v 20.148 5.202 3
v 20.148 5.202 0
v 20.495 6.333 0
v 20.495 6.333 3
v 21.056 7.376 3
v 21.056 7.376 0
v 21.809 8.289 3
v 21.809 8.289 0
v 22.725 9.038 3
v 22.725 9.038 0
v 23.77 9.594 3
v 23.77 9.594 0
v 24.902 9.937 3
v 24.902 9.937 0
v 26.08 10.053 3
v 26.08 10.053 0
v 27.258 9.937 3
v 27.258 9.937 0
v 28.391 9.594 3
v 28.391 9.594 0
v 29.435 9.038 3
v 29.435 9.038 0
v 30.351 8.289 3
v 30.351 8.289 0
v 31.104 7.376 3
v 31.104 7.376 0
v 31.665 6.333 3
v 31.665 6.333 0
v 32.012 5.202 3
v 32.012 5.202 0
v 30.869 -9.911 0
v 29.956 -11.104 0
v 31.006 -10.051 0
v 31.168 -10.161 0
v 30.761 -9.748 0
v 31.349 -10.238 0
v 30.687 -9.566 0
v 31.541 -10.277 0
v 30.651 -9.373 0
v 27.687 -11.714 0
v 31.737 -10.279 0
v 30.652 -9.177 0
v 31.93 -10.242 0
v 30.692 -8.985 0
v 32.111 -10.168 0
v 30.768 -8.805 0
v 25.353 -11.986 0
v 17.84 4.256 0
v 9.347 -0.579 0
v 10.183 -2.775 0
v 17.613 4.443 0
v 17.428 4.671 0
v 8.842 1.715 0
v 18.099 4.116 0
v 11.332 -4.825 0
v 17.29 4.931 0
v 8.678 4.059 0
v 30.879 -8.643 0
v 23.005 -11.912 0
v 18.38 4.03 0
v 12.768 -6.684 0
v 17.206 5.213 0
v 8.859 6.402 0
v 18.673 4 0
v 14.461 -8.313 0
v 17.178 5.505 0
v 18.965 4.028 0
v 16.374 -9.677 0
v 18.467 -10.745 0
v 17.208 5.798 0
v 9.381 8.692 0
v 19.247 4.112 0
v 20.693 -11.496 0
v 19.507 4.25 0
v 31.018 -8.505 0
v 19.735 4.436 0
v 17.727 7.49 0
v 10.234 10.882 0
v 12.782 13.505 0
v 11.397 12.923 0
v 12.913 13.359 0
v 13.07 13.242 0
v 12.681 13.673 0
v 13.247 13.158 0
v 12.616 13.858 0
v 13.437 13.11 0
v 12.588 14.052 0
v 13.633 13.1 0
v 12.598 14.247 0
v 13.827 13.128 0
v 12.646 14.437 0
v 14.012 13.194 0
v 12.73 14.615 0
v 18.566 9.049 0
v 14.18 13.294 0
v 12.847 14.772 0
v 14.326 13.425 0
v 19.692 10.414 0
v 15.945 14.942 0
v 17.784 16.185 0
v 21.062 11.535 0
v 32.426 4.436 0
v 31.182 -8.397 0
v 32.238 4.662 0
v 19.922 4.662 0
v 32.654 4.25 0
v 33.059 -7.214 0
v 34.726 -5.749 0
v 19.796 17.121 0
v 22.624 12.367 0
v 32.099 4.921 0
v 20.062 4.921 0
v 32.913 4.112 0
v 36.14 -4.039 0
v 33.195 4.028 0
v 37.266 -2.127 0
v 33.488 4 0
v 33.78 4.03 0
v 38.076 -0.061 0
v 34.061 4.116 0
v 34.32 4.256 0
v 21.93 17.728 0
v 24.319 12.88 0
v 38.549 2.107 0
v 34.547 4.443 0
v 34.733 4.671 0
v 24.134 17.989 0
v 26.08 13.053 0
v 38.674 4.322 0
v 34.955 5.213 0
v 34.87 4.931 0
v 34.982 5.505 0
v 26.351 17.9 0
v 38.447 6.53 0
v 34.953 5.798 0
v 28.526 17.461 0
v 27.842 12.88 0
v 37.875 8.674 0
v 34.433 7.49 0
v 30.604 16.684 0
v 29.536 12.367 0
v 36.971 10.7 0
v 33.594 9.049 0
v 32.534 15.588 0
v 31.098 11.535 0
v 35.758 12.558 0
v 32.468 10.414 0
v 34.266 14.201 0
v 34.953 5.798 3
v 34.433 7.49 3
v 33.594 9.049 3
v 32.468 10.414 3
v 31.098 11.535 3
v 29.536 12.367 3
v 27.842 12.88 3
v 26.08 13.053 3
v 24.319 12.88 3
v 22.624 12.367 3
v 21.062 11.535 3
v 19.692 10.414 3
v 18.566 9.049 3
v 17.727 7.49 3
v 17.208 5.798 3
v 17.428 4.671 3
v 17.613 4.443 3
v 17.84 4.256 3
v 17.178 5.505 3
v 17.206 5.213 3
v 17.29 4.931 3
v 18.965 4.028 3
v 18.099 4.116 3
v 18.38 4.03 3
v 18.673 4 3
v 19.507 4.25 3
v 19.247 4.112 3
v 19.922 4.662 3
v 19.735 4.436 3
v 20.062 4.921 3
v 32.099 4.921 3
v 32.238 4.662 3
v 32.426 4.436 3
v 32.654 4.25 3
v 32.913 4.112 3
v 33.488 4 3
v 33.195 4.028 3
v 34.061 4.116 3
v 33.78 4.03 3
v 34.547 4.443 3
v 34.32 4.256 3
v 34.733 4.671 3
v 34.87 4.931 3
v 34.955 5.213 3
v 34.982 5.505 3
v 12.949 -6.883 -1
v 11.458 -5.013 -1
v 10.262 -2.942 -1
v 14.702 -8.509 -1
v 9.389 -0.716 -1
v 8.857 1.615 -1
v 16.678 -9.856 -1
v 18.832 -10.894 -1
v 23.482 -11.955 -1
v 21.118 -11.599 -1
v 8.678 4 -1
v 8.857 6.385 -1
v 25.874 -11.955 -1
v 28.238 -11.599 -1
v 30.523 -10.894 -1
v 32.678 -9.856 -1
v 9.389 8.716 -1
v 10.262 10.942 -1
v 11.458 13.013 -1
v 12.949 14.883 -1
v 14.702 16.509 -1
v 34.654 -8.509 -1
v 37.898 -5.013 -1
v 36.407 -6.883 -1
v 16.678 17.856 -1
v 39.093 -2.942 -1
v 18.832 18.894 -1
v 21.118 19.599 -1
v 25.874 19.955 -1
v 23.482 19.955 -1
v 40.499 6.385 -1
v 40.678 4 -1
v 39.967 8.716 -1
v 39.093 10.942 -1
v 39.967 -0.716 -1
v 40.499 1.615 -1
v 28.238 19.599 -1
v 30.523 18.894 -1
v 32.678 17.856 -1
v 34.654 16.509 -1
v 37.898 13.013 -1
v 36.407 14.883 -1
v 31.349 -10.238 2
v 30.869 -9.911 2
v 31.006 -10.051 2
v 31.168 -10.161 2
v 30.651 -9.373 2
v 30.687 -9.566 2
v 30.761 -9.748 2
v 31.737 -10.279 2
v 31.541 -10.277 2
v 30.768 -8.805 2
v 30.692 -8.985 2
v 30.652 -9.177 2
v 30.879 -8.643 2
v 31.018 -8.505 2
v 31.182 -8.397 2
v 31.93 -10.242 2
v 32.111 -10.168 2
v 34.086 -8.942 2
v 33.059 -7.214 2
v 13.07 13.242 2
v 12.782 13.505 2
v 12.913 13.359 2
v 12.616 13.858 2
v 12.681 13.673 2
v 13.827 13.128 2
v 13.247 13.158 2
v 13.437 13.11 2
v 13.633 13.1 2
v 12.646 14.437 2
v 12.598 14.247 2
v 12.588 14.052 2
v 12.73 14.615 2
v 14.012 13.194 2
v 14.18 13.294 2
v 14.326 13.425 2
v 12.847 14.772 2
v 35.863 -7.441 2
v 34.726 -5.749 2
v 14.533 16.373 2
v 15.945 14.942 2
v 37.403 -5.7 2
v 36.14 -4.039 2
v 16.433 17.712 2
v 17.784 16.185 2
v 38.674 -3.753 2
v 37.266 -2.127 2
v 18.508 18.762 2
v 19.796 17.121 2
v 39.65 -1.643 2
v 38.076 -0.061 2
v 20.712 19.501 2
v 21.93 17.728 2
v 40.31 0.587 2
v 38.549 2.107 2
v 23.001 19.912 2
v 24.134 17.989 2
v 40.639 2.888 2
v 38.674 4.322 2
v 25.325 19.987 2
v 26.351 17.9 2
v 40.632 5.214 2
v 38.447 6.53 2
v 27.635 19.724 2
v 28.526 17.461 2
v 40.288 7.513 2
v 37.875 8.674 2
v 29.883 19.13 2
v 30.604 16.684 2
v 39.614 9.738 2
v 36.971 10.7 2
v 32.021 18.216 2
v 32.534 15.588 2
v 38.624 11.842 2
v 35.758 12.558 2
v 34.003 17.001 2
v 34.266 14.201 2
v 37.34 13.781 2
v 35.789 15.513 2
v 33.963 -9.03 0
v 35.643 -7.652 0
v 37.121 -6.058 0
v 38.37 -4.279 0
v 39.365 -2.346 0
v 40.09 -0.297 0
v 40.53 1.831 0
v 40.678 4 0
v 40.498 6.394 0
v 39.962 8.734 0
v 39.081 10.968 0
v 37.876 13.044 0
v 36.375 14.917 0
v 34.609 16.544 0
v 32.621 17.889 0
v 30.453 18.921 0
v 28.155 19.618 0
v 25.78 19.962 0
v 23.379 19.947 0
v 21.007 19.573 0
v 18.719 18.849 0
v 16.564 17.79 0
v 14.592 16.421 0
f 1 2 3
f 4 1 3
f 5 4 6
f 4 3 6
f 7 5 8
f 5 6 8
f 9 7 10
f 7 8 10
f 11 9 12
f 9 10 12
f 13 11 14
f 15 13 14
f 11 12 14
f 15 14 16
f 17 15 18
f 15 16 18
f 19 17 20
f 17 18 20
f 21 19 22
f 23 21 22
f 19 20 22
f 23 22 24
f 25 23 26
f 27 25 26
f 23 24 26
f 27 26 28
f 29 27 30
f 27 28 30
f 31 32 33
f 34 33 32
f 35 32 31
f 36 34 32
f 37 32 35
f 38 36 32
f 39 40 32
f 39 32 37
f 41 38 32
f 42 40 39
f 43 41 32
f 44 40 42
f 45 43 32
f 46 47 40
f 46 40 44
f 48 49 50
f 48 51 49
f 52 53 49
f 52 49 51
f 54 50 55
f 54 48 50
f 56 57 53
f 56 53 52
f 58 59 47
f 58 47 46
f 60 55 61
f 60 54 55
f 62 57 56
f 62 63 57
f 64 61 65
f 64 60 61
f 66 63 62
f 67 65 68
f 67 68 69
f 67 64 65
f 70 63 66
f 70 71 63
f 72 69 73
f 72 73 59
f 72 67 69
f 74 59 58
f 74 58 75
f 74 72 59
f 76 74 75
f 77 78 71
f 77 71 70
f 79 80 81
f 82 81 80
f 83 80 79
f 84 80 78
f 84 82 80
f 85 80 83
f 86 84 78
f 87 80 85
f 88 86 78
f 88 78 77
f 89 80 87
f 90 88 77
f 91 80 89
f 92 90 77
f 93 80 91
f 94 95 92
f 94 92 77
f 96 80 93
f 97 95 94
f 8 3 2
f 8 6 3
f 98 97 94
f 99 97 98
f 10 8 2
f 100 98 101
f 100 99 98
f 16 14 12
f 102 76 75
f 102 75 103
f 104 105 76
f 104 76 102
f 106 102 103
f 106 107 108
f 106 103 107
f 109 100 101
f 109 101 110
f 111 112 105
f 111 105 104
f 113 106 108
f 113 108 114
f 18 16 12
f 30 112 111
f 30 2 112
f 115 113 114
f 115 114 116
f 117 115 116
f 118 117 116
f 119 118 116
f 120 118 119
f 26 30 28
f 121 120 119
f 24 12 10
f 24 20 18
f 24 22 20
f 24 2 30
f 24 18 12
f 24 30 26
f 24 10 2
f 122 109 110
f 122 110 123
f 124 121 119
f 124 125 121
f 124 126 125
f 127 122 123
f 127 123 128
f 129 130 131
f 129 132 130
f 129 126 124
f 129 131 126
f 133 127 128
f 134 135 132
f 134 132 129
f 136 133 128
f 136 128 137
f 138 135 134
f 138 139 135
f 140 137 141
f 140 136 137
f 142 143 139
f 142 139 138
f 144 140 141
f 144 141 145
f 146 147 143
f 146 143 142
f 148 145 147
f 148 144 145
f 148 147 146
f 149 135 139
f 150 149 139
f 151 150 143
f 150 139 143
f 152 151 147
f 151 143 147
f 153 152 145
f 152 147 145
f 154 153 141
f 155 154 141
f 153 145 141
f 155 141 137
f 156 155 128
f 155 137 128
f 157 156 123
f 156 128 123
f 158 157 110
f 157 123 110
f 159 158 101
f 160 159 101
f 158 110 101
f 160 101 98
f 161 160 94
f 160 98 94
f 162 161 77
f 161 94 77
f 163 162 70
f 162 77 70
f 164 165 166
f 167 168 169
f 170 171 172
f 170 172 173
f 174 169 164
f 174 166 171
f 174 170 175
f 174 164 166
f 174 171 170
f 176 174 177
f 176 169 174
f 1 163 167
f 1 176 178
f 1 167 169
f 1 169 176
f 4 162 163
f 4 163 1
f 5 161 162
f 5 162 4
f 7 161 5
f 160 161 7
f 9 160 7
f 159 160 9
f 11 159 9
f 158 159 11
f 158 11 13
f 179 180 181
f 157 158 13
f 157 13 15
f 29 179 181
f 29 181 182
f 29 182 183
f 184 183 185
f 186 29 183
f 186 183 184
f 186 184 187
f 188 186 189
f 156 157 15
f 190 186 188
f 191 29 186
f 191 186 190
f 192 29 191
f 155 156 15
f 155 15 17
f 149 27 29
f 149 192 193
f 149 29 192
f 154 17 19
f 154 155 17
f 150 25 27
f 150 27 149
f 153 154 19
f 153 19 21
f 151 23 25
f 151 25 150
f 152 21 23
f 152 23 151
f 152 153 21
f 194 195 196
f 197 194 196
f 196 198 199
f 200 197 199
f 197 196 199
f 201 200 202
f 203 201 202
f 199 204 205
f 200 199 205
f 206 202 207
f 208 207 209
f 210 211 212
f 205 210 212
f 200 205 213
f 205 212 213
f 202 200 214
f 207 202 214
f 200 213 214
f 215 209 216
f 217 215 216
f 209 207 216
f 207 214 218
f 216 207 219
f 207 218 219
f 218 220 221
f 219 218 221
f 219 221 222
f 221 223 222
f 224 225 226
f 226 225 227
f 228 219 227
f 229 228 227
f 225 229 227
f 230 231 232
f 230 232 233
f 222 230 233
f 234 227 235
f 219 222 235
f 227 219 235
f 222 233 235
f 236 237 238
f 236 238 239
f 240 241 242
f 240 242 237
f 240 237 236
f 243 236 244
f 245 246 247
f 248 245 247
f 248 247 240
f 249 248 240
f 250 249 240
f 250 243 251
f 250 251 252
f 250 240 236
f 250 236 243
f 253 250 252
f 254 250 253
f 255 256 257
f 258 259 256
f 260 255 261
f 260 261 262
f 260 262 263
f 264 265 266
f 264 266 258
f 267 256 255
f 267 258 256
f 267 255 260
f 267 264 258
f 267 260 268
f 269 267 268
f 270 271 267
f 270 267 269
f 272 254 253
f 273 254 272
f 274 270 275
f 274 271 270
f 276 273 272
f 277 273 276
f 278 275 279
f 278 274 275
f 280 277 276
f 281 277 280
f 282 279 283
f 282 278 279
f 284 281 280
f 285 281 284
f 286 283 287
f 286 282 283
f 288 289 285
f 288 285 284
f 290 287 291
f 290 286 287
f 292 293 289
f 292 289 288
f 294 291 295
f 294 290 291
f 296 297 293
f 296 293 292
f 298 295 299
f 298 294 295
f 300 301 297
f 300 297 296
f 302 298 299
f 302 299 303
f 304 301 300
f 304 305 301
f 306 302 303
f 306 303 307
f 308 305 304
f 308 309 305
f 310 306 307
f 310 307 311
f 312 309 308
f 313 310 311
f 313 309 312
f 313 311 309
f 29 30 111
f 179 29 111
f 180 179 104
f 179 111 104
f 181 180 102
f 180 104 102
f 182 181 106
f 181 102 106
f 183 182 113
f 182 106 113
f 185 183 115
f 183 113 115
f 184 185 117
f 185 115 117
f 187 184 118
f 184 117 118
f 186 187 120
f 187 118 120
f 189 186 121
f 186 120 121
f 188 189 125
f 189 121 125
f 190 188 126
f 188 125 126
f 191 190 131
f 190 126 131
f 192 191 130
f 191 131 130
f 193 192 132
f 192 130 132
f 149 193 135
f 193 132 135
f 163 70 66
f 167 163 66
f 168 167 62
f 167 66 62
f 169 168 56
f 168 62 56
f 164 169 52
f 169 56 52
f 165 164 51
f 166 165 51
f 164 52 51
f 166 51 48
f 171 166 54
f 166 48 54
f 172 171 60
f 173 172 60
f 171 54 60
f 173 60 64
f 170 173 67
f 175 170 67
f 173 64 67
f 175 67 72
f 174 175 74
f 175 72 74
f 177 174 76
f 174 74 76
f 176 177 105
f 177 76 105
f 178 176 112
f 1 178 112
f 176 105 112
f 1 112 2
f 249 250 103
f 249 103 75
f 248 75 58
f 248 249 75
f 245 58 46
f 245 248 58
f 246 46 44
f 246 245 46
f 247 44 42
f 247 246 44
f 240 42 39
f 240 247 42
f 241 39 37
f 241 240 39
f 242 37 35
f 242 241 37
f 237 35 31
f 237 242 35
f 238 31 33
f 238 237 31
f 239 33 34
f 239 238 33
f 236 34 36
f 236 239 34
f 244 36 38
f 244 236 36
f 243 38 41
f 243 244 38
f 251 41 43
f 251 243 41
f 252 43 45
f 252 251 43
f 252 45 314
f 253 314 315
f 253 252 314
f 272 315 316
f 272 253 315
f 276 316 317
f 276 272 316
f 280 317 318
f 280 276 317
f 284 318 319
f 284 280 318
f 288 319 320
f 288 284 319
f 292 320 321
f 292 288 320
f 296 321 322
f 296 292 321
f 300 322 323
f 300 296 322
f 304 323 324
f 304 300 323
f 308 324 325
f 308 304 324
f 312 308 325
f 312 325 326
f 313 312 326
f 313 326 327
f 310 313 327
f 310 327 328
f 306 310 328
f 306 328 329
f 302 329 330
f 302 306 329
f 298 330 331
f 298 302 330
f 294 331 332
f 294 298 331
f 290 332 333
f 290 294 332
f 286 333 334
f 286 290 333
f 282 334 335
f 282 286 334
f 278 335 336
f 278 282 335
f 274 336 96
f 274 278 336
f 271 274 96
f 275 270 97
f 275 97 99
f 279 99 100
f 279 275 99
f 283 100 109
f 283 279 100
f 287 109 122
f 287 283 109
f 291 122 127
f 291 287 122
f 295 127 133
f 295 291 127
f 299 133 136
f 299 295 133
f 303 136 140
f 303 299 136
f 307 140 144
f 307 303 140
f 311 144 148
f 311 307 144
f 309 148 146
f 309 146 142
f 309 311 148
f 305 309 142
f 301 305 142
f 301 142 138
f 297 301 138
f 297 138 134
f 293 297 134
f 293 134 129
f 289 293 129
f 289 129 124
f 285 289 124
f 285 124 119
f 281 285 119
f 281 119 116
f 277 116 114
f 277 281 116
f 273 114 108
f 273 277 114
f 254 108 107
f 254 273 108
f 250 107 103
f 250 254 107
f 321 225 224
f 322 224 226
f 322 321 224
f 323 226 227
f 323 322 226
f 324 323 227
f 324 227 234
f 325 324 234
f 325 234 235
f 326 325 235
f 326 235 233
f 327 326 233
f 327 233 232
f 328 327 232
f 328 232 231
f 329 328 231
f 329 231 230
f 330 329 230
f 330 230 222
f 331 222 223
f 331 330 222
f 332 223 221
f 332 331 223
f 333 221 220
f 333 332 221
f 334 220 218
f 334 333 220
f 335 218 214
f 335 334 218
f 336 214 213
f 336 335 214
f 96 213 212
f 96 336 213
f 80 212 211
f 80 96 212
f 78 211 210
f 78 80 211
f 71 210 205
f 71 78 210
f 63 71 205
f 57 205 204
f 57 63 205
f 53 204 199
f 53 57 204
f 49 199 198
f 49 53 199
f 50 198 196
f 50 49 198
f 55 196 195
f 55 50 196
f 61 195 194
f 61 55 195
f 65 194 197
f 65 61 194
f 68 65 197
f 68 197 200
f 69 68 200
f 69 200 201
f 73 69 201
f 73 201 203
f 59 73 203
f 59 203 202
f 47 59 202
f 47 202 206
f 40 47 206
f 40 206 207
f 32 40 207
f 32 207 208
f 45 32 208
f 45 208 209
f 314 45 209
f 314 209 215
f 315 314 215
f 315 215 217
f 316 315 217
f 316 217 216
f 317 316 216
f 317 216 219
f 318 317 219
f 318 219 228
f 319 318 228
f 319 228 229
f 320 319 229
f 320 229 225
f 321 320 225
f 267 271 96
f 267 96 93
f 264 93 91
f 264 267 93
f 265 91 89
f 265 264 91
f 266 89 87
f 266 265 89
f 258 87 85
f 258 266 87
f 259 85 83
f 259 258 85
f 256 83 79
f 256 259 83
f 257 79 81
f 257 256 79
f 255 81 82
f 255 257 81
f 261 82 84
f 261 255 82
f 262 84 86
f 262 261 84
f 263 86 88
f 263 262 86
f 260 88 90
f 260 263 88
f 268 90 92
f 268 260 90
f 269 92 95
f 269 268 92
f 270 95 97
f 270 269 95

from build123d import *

# Parameters (mm, degrees)
SKETCH1_R           = 16
BOSS_EXTRUDE1_DEPTH = 1
BOSS_EXTRUDE2_DEPTH = 3
BOSS_EXTRUDE3_START = 2
BOSS_EXTRUDE3_DEPTH = 2


with BuildPart() as part:
    # Sketch1 → Boss-Extrude1 (new body)
    with BuildSketch(Plane.XY):
        with Locations((24.677925359, 4)):
            Circle(SKETCH1_R)
    extrude(amount=-BOSS_EXTRUDE1_DEPTH)

    # Sketch1<3> → Boss-Extrude2 (add)
    with BuildSketch(Plane.XY):
        with BuildLine():
            ThreePointArc((34.952555431, 5.797906435), (26.080180575, 13.052706951), (17.207805718, 5.797906435))
            ThreePointArc((17.207805718, 5.797906435), (18.380018924, 4.02988036), (20.148044999, 5.202093565))
            ThreePointArc((20.148044999, 5.202093565), (26.080180575, 10.052706951), (32.01231615, 5.202093565))
            ThreePointArc((32.01231615, 5.202093565), (33.780342225, 4.02988036), (34.952555431, 5.797906435))
        make_face()
    extrude(amount=BOSS_EXTRUDE2_DEPTH)

    # Sketch2 → Boss-Extrude3 (add)
    with BuildSketch(Plane.XY.offset(BOSS_EXTRUDE3_START)):
        with BuildLine():
            ThreePointArc((32.111206734, -10.168497733), (37.340396009, 13.78068694), (12.847014077, 14.771700806))
            ThreePointArc((12.847014077, 14.771700806), (12.913214732, 13.35903755), (14.325877987, 13.425238205))
            ThreePointArc((14.325877987, 13.425238205), (35.757587178, 12.558101073), (31.182046562, -8.397435516))
            ThreePointArc((31.182046562, -8.397435516), (30.761095539, -9.74754671), (32.111206734, -10.168497733))
        make_face()
    extrude(amount=-BOSS_EXTRUDE3_DEPTH)


solid = part.part
